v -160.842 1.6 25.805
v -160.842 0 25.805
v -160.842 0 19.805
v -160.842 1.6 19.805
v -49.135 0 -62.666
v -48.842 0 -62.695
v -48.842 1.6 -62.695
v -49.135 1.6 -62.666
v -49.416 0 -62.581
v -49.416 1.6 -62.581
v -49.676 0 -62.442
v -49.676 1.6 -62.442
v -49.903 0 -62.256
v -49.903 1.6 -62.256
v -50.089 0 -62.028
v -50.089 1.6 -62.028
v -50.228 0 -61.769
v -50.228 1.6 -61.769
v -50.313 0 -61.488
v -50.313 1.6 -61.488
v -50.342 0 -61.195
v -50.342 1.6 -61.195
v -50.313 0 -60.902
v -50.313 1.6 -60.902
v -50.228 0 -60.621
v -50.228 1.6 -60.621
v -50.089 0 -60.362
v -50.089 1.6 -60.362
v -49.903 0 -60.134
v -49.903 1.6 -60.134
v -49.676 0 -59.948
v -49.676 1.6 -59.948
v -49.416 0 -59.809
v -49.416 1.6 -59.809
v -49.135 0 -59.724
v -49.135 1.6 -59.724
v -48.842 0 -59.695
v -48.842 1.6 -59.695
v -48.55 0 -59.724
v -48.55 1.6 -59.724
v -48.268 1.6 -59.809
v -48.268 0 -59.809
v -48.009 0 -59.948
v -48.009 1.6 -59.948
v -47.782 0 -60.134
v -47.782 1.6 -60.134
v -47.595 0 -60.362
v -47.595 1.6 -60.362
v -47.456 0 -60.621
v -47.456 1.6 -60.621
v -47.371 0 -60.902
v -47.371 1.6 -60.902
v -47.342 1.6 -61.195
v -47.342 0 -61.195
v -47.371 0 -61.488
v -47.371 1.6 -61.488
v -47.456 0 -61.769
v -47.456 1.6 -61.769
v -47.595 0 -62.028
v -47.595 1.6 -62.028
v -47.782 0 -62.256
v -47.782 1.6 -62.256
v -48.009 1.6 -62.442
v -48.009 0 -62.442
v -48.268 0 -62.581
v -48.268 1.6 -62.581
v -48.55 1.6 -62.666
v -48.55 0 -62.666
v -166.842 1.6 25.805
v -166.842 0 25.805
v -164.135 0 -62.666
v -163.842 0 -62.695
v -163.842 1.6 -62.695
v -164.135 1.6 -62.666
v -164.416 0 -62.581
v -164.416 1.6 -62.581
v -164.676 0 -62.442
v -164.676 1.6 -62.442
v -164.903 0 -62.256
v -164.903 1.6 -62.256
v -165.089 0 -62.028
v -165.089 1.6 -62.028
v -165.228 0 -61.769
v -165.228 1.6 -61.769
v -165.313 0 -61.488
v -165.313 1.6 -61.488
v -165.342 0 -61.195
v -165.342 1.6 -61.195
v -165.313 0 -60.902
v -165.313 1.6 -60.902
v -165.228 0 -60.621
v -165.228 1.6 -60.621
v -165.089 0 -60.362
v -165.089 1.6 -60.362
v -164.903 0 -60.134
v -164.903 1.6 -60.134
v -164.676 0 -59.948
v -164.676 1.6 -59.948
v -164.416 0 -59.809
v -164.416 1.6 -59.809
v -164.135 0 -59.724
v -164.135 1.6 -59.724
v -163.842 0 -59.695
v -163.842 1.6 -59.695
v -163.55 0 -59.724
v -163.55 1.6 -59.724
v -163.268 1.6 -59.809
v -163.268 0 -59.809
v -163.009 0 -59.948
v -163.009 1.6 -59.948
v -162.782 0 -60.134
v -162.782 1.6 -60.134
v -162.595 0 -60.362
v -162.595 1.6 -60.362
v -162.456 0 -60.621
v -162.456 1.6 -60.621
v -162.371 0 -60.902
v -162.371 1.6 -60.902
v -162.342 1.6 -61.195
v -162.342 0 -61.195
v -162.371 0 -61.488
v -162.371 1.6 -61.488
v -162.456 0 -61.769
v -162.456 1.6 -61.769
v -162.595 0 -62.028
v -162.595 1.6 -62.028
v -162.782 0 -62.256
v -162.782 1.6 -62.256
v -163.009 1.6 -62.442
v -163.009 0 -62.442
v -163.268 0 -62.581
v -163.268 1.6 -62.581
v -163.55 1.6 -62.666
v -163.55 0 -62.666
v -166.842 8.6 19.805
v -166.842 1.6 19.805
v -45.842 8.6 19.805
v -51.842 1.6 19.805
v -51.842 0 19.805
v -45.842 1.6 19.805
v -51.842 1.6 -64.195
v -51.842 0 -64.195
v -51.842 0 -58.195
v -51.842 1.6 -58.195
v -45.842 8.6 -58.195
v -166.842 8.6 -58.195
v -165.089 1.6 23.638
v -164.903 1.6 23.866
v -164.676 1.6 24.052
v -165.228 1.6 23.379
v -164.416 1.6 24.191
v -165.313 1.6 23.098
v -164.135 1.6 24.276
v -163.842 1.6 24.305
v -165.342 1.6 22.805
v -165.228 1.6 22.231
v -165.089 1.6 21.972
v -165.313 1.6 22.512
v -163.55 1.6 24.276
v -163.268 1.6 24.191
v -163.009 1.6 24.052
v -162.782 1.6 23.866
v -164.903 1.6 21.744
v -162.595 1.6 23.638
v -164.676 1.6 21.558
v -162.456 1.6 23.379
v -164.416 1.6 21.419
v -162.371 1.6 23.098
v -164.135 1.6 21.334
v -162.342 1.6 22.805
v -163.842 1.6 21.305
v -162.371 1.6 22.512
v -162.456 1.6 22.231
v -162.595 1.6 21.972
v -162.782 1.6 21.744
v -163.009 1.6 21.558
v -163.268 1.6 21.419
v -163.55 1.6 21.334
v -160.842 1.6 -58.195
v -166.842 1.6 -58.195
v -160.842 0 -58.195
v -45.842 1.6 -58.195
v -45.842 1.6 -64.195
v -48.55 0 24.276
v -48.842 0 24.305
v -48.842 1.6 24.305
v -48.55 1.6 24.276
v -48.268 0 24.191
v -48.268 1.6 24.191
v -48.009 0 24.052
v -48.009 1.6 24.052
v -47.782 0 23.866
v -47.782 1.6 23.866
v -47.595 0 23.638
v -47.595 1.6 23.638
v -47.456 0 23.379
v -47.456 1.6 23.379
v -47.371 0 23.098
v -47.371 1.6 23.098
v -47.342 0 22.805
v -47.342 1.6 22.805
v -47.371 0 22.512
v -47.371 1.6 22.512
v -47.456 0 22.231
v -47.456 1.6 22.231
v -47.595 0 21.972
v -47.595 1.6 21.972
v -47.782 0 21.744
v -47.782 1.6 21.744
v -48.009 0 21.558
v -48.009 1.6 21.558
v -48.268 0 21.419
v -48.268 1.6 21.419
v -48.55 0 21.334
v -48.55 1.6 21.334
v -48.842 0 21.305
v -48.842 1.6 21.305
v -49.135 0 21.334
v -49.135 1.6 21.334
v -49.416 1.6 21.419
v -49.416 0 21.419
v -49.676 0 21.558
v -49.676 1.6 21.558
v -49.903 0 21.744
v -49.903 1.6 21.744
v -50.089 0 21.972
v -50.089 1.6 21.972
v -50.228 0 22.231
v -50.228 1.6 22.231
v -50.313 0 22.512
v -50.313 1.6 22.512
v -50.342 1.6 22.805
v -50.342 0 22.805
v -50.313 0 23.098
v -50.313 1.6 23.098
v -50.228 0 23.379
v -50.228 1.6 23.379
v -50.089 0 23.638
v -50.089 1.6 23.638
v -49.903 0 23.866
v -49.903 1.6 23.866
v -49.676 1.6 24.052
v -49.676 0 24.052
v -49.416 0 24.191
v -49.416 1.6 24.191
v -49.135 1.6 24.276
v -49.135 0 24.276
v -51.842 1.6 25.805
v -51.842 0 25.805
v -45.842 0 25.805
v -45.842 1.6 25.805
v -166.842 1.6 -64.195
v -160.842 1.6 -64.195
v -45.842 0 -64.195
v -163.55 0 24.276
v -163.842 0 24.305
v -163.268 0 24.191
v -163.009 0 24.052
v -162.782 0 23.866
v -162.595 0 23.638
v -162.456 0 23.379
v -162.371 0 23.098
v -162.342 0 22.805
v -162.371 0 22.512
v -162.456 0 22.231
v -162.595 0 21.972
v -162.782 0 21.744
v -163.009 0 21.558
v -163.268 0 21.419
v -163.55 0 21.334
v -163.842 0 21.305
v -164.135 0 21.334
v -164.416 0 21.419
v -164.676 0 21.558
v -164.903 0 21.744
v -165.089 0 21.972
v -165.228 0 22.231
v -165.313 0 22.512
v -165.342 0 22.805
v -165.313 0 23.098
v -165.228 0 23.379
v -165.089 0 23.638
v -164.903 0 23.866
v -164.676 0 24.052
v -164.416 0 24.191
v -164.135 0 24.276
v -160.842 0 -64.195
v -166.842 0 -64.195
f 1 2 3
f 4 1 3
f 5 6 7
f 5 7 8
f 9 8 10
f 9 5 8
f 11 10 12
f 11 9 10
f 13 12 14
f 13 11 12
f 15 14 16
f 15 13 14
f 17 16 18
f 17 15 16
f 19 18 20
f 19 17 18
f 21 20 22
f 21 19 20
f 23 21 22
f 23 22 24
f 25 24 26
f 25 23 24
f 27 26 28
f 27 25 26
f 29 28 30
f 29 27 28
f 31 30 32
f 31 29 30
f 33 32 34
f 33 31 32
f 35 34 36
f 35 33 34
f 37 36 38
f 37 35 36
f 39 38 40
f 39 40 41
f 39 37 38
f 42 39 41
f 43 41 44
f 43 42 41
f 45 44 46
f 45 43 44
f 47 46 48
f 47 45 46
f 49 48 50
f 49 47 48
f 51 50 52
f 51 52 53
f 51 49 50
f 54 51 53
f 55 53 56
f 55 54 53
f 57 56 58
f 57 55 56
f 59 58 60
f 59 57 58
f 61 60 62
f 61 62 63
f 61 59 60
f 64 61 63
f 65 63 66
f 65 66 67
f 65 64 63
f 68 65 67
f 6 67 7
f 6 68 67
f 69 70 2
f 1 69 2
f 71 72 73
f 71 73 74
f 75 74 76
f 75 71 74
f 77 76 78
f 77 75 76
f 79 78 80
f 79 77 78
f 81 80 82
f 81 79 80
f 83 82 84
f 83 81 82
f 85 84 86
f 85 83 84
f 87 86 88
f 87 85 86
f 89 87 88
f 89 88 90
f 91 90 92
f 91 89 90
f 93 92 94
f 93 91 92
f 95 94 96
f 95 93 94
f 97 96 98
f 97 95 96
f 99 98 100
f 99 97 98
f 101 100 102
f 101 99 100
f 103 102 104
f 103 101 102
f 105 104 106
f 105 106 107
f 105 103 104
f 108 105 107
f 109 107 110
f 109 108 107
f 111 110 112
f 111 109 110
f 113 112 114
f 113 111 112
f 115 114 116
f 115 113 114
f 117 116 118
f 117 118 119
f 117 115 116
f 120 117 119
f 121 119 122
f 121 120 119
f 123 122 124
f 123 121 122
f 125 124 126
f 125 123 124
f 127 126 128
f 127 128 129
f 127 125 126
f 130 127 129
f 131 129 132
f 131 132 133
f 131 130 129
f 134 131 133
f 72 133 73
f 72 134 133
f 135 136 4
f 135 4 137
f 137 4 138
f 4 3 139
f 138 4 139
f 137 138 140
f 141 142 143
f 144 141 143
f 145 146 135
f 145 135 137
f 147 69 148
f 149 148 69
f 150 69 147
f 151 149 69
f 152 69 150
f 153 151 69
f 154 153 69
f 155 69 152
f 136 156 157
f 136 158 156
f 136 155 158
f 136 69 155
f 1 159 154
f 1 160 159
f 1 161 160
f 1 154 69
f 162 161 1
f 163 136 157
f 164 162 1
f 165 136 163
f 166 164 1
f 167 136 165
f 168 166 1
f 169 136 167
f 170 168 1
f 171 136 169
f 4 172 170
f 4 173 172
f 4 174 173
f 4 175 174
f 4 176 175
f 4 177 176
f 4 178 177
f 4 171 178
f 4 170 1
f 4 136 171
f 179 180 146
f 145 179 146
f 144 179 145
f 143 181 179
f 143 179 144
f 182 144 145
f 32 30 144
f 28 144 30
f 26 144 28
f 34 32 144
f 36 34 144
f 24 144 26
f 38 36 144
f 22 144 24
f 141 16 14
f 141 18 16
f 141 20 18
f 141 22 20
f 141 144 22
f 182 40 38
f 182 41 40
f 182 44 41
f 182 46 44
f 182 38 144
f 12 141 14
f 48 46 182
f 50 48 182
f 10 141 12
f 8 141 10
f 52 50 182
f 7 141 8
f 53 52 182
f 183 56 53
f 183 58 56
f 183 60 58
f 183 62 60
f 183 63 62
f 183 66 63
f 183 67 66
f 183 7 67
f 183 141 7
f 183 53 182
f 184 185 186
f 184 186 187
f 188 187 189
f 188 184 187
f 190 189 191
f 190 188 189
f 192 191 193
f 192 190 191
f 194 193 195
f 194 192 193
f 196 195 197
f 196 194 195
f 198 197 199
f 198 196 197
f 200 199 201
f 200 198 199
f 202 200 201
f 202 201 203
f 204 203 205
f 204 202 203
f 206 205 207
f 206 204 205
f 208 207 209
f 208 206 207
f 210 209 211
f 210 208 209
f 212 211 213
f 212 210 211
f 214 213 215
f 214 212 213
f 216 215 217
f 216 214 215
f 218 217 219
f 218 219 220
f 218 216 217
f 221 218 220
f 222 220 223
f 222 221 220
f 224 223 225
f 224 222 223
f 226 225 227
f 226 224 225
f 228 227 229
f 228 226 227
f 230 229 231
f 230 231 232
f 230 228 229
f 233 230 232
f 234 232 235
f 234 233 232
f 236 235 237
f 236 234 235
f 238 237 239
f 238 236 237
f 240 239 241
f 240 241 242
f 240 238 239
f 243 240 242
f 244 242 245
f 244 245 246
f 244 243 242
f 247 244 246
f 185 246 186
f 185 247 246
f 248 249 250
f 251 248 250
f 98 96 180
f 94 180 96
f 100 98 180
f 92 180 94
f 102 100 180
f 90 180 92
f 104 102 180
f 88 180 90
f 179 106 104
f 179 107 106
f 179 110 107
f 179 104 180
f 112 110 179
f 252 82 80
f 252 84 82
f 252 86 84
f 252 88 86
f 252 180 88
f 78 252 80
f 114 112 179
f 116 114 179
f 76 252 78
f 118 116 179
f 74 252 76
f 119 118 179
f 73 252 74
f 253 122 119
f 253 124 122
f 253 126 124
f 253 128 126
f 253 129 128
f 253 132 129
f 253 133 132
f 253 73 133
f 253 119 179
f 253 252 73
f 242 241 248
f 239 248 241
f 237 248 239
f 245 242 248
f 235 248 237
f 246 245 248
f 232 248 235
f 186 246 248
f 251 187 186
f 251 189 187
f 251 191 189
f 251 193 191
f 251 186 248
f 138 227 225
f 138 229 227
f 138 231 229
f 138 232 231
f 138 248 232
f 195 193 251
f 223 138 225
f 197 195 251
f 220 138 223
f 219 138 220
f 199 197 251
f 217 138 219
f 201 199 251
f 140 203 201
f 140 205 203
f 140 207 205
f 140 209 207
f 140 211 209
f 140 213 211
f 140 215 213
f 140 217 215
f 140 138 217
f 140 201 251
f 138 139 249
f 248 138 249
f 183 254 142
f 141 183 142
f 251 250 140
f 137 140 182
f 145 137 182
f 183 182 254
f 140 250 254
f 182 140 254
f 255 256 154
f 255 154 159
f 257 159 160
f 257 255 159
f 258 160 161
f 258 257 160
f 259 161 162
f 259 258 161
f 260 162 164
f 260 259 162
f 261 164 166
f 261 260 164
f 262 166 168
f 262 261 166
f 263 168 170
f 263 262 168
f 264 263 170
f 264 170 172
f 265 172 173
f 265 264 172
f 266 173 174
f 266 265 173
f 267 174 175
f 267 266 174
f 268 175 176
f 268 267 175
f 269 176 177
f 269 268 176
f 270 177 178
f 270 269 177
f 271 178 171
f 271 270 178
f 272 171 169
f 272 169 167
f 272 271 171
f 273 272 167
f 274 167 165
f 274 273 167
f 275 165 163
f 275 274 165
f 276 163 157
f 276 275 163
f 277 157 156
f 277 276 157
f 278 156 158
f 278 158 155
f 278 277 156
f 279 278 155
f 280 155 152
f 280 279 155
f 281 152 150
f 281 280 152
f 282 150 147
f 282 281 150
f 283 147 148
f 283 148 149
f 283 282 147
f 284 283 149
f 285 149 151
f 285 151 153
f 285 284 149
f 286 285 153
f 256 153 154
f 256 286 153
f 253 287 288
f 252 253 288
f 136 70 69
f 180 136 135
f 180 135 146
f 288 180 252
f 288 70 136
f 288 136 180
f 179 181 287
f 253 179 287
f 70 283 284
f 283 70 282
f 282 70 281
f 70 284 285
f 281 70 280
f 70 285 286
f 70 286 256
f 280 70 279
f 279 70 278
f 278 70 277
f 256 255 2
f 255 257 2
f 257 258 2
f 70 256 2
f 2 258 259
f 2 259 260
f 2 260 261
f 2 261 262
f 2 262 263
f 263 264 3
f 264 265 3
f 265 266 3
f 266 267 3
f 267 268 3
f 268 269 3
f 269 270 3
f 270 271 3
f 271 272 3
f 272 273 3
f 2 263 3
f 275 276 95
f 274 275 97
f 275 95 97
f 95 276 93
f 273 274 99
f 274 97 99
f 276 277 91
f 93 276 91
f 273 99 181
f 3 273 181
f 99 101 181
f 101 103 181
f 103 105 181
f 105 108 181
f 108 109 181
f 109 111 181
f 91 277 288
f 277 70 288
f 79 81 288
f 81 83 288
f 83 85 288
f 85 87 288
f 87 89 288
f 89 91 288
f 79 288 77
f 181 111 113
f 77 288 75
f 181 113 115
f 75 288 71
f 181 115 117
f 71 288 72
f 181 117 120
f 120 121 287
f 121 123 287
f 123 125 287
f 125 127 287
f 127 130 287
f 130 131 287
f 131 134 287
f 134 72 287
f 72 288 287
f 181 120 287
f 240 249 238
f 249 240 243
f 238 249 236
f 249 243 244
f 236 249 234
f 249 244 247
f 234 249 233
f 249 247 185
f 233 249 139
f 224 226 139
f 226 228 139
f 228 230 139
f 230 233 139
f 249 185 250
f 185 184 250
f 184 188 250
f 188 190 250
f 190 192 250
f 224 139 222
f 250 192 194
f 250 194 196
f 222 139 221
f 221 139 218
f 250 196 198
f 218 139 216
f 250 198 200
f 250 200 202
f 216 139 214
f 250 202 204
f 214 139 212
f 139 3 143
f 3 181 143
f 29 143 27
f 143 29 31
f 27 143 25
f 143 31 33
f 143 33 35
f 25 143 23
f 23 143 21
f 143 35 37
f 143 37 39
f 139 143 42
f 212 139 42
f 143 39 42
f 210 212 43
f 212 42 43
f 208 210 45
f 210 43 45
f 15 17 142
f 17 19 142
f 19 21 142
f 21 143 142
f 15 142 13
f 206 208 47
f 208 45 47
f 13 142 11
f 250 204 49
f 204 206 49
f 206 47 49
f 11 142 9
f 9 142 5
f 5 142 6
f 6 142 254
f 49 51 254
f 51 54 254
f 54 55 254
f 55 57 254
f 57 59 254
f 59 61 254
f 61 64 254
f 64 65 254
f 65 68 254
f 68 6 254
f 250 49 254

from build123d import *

# Parameters (mm, degrees)
SKETCH1_R           = 1.5
BOSS_EXTRUDE1_DEPTH = 1.6
SKETCH2_W           = 121
SKETCH2_H           = 78
BOSS_EXTRUDE2_DEPTH = 7


with BuildPart() as part:
    # Sketch1 → Boss-Extrude1 (new body)
    with BuildSketch(Plane(origin=(0, 0, 0), x_dir=(1, 0, 0), z_dir=(0, 1, 0))):
        Polygon((-166.842260972, 58.195002586), (-166.842260972, -19.804997414), (-166.842260972, -25.804997414), (-160.842260972, -25.804997414), (-160.842260972, -19.804997414), (-51.842260972, -19.804997414), (-51.842260972, -25.804997414), (-45.842260972, -25.804997414), (-45.842260972, -19.804997414), (-45.842260972, 58.195002586), (-45.842260972, 64.195002586), (-51.842260972, 64.195002586), (-51.842260972, 58.195002586), (-160.842260972, 58.195002586), (-160.842260972, 64.195002586), (-166.842260972, 64.195002586), align=None)
        with Locations(Location((-48.842260972, -22.804997414, 0), (0, 0, 270))):
            Circle(SKETCH1_R, mode=Mode.SUBTRACT)
        with Locations(Location((-163.842260972, -22.804997414, 0), (0, 0, 270))):
            Circle(SKETCH1_R, mode=Mode.SUBTRACT)
        with Locations(Location((-48.842260972, 61.195002586, 0), (0, 0, 90))):
            Circle(SKETCH1_R, mode=Mode.SUBTRACT)
        with Locations(Location((-163.842260972, 61.195002586, 0), (0, 0, 90))):
            Circle(SKETCH1_R, mode=Mode.SUBTRACT)
    extrude(amount=BOSS_EXTRUDE1_DEPTH)

    # Sketch2 → Boss-Extrude2 (add)
    with BuildSketch(Plane(origin=(0, 1.6, 0), x_dir=(1, 0, 0), z_dir=(0, 1, 0))):
        with Locations((-106.342260972, 19.195002586)):
            Rectangle(SKETCH2_W, SKETCH2_H)
    extrude(amount=BOSS_EXTRUDE2_DEPTH)


solid = part.part
